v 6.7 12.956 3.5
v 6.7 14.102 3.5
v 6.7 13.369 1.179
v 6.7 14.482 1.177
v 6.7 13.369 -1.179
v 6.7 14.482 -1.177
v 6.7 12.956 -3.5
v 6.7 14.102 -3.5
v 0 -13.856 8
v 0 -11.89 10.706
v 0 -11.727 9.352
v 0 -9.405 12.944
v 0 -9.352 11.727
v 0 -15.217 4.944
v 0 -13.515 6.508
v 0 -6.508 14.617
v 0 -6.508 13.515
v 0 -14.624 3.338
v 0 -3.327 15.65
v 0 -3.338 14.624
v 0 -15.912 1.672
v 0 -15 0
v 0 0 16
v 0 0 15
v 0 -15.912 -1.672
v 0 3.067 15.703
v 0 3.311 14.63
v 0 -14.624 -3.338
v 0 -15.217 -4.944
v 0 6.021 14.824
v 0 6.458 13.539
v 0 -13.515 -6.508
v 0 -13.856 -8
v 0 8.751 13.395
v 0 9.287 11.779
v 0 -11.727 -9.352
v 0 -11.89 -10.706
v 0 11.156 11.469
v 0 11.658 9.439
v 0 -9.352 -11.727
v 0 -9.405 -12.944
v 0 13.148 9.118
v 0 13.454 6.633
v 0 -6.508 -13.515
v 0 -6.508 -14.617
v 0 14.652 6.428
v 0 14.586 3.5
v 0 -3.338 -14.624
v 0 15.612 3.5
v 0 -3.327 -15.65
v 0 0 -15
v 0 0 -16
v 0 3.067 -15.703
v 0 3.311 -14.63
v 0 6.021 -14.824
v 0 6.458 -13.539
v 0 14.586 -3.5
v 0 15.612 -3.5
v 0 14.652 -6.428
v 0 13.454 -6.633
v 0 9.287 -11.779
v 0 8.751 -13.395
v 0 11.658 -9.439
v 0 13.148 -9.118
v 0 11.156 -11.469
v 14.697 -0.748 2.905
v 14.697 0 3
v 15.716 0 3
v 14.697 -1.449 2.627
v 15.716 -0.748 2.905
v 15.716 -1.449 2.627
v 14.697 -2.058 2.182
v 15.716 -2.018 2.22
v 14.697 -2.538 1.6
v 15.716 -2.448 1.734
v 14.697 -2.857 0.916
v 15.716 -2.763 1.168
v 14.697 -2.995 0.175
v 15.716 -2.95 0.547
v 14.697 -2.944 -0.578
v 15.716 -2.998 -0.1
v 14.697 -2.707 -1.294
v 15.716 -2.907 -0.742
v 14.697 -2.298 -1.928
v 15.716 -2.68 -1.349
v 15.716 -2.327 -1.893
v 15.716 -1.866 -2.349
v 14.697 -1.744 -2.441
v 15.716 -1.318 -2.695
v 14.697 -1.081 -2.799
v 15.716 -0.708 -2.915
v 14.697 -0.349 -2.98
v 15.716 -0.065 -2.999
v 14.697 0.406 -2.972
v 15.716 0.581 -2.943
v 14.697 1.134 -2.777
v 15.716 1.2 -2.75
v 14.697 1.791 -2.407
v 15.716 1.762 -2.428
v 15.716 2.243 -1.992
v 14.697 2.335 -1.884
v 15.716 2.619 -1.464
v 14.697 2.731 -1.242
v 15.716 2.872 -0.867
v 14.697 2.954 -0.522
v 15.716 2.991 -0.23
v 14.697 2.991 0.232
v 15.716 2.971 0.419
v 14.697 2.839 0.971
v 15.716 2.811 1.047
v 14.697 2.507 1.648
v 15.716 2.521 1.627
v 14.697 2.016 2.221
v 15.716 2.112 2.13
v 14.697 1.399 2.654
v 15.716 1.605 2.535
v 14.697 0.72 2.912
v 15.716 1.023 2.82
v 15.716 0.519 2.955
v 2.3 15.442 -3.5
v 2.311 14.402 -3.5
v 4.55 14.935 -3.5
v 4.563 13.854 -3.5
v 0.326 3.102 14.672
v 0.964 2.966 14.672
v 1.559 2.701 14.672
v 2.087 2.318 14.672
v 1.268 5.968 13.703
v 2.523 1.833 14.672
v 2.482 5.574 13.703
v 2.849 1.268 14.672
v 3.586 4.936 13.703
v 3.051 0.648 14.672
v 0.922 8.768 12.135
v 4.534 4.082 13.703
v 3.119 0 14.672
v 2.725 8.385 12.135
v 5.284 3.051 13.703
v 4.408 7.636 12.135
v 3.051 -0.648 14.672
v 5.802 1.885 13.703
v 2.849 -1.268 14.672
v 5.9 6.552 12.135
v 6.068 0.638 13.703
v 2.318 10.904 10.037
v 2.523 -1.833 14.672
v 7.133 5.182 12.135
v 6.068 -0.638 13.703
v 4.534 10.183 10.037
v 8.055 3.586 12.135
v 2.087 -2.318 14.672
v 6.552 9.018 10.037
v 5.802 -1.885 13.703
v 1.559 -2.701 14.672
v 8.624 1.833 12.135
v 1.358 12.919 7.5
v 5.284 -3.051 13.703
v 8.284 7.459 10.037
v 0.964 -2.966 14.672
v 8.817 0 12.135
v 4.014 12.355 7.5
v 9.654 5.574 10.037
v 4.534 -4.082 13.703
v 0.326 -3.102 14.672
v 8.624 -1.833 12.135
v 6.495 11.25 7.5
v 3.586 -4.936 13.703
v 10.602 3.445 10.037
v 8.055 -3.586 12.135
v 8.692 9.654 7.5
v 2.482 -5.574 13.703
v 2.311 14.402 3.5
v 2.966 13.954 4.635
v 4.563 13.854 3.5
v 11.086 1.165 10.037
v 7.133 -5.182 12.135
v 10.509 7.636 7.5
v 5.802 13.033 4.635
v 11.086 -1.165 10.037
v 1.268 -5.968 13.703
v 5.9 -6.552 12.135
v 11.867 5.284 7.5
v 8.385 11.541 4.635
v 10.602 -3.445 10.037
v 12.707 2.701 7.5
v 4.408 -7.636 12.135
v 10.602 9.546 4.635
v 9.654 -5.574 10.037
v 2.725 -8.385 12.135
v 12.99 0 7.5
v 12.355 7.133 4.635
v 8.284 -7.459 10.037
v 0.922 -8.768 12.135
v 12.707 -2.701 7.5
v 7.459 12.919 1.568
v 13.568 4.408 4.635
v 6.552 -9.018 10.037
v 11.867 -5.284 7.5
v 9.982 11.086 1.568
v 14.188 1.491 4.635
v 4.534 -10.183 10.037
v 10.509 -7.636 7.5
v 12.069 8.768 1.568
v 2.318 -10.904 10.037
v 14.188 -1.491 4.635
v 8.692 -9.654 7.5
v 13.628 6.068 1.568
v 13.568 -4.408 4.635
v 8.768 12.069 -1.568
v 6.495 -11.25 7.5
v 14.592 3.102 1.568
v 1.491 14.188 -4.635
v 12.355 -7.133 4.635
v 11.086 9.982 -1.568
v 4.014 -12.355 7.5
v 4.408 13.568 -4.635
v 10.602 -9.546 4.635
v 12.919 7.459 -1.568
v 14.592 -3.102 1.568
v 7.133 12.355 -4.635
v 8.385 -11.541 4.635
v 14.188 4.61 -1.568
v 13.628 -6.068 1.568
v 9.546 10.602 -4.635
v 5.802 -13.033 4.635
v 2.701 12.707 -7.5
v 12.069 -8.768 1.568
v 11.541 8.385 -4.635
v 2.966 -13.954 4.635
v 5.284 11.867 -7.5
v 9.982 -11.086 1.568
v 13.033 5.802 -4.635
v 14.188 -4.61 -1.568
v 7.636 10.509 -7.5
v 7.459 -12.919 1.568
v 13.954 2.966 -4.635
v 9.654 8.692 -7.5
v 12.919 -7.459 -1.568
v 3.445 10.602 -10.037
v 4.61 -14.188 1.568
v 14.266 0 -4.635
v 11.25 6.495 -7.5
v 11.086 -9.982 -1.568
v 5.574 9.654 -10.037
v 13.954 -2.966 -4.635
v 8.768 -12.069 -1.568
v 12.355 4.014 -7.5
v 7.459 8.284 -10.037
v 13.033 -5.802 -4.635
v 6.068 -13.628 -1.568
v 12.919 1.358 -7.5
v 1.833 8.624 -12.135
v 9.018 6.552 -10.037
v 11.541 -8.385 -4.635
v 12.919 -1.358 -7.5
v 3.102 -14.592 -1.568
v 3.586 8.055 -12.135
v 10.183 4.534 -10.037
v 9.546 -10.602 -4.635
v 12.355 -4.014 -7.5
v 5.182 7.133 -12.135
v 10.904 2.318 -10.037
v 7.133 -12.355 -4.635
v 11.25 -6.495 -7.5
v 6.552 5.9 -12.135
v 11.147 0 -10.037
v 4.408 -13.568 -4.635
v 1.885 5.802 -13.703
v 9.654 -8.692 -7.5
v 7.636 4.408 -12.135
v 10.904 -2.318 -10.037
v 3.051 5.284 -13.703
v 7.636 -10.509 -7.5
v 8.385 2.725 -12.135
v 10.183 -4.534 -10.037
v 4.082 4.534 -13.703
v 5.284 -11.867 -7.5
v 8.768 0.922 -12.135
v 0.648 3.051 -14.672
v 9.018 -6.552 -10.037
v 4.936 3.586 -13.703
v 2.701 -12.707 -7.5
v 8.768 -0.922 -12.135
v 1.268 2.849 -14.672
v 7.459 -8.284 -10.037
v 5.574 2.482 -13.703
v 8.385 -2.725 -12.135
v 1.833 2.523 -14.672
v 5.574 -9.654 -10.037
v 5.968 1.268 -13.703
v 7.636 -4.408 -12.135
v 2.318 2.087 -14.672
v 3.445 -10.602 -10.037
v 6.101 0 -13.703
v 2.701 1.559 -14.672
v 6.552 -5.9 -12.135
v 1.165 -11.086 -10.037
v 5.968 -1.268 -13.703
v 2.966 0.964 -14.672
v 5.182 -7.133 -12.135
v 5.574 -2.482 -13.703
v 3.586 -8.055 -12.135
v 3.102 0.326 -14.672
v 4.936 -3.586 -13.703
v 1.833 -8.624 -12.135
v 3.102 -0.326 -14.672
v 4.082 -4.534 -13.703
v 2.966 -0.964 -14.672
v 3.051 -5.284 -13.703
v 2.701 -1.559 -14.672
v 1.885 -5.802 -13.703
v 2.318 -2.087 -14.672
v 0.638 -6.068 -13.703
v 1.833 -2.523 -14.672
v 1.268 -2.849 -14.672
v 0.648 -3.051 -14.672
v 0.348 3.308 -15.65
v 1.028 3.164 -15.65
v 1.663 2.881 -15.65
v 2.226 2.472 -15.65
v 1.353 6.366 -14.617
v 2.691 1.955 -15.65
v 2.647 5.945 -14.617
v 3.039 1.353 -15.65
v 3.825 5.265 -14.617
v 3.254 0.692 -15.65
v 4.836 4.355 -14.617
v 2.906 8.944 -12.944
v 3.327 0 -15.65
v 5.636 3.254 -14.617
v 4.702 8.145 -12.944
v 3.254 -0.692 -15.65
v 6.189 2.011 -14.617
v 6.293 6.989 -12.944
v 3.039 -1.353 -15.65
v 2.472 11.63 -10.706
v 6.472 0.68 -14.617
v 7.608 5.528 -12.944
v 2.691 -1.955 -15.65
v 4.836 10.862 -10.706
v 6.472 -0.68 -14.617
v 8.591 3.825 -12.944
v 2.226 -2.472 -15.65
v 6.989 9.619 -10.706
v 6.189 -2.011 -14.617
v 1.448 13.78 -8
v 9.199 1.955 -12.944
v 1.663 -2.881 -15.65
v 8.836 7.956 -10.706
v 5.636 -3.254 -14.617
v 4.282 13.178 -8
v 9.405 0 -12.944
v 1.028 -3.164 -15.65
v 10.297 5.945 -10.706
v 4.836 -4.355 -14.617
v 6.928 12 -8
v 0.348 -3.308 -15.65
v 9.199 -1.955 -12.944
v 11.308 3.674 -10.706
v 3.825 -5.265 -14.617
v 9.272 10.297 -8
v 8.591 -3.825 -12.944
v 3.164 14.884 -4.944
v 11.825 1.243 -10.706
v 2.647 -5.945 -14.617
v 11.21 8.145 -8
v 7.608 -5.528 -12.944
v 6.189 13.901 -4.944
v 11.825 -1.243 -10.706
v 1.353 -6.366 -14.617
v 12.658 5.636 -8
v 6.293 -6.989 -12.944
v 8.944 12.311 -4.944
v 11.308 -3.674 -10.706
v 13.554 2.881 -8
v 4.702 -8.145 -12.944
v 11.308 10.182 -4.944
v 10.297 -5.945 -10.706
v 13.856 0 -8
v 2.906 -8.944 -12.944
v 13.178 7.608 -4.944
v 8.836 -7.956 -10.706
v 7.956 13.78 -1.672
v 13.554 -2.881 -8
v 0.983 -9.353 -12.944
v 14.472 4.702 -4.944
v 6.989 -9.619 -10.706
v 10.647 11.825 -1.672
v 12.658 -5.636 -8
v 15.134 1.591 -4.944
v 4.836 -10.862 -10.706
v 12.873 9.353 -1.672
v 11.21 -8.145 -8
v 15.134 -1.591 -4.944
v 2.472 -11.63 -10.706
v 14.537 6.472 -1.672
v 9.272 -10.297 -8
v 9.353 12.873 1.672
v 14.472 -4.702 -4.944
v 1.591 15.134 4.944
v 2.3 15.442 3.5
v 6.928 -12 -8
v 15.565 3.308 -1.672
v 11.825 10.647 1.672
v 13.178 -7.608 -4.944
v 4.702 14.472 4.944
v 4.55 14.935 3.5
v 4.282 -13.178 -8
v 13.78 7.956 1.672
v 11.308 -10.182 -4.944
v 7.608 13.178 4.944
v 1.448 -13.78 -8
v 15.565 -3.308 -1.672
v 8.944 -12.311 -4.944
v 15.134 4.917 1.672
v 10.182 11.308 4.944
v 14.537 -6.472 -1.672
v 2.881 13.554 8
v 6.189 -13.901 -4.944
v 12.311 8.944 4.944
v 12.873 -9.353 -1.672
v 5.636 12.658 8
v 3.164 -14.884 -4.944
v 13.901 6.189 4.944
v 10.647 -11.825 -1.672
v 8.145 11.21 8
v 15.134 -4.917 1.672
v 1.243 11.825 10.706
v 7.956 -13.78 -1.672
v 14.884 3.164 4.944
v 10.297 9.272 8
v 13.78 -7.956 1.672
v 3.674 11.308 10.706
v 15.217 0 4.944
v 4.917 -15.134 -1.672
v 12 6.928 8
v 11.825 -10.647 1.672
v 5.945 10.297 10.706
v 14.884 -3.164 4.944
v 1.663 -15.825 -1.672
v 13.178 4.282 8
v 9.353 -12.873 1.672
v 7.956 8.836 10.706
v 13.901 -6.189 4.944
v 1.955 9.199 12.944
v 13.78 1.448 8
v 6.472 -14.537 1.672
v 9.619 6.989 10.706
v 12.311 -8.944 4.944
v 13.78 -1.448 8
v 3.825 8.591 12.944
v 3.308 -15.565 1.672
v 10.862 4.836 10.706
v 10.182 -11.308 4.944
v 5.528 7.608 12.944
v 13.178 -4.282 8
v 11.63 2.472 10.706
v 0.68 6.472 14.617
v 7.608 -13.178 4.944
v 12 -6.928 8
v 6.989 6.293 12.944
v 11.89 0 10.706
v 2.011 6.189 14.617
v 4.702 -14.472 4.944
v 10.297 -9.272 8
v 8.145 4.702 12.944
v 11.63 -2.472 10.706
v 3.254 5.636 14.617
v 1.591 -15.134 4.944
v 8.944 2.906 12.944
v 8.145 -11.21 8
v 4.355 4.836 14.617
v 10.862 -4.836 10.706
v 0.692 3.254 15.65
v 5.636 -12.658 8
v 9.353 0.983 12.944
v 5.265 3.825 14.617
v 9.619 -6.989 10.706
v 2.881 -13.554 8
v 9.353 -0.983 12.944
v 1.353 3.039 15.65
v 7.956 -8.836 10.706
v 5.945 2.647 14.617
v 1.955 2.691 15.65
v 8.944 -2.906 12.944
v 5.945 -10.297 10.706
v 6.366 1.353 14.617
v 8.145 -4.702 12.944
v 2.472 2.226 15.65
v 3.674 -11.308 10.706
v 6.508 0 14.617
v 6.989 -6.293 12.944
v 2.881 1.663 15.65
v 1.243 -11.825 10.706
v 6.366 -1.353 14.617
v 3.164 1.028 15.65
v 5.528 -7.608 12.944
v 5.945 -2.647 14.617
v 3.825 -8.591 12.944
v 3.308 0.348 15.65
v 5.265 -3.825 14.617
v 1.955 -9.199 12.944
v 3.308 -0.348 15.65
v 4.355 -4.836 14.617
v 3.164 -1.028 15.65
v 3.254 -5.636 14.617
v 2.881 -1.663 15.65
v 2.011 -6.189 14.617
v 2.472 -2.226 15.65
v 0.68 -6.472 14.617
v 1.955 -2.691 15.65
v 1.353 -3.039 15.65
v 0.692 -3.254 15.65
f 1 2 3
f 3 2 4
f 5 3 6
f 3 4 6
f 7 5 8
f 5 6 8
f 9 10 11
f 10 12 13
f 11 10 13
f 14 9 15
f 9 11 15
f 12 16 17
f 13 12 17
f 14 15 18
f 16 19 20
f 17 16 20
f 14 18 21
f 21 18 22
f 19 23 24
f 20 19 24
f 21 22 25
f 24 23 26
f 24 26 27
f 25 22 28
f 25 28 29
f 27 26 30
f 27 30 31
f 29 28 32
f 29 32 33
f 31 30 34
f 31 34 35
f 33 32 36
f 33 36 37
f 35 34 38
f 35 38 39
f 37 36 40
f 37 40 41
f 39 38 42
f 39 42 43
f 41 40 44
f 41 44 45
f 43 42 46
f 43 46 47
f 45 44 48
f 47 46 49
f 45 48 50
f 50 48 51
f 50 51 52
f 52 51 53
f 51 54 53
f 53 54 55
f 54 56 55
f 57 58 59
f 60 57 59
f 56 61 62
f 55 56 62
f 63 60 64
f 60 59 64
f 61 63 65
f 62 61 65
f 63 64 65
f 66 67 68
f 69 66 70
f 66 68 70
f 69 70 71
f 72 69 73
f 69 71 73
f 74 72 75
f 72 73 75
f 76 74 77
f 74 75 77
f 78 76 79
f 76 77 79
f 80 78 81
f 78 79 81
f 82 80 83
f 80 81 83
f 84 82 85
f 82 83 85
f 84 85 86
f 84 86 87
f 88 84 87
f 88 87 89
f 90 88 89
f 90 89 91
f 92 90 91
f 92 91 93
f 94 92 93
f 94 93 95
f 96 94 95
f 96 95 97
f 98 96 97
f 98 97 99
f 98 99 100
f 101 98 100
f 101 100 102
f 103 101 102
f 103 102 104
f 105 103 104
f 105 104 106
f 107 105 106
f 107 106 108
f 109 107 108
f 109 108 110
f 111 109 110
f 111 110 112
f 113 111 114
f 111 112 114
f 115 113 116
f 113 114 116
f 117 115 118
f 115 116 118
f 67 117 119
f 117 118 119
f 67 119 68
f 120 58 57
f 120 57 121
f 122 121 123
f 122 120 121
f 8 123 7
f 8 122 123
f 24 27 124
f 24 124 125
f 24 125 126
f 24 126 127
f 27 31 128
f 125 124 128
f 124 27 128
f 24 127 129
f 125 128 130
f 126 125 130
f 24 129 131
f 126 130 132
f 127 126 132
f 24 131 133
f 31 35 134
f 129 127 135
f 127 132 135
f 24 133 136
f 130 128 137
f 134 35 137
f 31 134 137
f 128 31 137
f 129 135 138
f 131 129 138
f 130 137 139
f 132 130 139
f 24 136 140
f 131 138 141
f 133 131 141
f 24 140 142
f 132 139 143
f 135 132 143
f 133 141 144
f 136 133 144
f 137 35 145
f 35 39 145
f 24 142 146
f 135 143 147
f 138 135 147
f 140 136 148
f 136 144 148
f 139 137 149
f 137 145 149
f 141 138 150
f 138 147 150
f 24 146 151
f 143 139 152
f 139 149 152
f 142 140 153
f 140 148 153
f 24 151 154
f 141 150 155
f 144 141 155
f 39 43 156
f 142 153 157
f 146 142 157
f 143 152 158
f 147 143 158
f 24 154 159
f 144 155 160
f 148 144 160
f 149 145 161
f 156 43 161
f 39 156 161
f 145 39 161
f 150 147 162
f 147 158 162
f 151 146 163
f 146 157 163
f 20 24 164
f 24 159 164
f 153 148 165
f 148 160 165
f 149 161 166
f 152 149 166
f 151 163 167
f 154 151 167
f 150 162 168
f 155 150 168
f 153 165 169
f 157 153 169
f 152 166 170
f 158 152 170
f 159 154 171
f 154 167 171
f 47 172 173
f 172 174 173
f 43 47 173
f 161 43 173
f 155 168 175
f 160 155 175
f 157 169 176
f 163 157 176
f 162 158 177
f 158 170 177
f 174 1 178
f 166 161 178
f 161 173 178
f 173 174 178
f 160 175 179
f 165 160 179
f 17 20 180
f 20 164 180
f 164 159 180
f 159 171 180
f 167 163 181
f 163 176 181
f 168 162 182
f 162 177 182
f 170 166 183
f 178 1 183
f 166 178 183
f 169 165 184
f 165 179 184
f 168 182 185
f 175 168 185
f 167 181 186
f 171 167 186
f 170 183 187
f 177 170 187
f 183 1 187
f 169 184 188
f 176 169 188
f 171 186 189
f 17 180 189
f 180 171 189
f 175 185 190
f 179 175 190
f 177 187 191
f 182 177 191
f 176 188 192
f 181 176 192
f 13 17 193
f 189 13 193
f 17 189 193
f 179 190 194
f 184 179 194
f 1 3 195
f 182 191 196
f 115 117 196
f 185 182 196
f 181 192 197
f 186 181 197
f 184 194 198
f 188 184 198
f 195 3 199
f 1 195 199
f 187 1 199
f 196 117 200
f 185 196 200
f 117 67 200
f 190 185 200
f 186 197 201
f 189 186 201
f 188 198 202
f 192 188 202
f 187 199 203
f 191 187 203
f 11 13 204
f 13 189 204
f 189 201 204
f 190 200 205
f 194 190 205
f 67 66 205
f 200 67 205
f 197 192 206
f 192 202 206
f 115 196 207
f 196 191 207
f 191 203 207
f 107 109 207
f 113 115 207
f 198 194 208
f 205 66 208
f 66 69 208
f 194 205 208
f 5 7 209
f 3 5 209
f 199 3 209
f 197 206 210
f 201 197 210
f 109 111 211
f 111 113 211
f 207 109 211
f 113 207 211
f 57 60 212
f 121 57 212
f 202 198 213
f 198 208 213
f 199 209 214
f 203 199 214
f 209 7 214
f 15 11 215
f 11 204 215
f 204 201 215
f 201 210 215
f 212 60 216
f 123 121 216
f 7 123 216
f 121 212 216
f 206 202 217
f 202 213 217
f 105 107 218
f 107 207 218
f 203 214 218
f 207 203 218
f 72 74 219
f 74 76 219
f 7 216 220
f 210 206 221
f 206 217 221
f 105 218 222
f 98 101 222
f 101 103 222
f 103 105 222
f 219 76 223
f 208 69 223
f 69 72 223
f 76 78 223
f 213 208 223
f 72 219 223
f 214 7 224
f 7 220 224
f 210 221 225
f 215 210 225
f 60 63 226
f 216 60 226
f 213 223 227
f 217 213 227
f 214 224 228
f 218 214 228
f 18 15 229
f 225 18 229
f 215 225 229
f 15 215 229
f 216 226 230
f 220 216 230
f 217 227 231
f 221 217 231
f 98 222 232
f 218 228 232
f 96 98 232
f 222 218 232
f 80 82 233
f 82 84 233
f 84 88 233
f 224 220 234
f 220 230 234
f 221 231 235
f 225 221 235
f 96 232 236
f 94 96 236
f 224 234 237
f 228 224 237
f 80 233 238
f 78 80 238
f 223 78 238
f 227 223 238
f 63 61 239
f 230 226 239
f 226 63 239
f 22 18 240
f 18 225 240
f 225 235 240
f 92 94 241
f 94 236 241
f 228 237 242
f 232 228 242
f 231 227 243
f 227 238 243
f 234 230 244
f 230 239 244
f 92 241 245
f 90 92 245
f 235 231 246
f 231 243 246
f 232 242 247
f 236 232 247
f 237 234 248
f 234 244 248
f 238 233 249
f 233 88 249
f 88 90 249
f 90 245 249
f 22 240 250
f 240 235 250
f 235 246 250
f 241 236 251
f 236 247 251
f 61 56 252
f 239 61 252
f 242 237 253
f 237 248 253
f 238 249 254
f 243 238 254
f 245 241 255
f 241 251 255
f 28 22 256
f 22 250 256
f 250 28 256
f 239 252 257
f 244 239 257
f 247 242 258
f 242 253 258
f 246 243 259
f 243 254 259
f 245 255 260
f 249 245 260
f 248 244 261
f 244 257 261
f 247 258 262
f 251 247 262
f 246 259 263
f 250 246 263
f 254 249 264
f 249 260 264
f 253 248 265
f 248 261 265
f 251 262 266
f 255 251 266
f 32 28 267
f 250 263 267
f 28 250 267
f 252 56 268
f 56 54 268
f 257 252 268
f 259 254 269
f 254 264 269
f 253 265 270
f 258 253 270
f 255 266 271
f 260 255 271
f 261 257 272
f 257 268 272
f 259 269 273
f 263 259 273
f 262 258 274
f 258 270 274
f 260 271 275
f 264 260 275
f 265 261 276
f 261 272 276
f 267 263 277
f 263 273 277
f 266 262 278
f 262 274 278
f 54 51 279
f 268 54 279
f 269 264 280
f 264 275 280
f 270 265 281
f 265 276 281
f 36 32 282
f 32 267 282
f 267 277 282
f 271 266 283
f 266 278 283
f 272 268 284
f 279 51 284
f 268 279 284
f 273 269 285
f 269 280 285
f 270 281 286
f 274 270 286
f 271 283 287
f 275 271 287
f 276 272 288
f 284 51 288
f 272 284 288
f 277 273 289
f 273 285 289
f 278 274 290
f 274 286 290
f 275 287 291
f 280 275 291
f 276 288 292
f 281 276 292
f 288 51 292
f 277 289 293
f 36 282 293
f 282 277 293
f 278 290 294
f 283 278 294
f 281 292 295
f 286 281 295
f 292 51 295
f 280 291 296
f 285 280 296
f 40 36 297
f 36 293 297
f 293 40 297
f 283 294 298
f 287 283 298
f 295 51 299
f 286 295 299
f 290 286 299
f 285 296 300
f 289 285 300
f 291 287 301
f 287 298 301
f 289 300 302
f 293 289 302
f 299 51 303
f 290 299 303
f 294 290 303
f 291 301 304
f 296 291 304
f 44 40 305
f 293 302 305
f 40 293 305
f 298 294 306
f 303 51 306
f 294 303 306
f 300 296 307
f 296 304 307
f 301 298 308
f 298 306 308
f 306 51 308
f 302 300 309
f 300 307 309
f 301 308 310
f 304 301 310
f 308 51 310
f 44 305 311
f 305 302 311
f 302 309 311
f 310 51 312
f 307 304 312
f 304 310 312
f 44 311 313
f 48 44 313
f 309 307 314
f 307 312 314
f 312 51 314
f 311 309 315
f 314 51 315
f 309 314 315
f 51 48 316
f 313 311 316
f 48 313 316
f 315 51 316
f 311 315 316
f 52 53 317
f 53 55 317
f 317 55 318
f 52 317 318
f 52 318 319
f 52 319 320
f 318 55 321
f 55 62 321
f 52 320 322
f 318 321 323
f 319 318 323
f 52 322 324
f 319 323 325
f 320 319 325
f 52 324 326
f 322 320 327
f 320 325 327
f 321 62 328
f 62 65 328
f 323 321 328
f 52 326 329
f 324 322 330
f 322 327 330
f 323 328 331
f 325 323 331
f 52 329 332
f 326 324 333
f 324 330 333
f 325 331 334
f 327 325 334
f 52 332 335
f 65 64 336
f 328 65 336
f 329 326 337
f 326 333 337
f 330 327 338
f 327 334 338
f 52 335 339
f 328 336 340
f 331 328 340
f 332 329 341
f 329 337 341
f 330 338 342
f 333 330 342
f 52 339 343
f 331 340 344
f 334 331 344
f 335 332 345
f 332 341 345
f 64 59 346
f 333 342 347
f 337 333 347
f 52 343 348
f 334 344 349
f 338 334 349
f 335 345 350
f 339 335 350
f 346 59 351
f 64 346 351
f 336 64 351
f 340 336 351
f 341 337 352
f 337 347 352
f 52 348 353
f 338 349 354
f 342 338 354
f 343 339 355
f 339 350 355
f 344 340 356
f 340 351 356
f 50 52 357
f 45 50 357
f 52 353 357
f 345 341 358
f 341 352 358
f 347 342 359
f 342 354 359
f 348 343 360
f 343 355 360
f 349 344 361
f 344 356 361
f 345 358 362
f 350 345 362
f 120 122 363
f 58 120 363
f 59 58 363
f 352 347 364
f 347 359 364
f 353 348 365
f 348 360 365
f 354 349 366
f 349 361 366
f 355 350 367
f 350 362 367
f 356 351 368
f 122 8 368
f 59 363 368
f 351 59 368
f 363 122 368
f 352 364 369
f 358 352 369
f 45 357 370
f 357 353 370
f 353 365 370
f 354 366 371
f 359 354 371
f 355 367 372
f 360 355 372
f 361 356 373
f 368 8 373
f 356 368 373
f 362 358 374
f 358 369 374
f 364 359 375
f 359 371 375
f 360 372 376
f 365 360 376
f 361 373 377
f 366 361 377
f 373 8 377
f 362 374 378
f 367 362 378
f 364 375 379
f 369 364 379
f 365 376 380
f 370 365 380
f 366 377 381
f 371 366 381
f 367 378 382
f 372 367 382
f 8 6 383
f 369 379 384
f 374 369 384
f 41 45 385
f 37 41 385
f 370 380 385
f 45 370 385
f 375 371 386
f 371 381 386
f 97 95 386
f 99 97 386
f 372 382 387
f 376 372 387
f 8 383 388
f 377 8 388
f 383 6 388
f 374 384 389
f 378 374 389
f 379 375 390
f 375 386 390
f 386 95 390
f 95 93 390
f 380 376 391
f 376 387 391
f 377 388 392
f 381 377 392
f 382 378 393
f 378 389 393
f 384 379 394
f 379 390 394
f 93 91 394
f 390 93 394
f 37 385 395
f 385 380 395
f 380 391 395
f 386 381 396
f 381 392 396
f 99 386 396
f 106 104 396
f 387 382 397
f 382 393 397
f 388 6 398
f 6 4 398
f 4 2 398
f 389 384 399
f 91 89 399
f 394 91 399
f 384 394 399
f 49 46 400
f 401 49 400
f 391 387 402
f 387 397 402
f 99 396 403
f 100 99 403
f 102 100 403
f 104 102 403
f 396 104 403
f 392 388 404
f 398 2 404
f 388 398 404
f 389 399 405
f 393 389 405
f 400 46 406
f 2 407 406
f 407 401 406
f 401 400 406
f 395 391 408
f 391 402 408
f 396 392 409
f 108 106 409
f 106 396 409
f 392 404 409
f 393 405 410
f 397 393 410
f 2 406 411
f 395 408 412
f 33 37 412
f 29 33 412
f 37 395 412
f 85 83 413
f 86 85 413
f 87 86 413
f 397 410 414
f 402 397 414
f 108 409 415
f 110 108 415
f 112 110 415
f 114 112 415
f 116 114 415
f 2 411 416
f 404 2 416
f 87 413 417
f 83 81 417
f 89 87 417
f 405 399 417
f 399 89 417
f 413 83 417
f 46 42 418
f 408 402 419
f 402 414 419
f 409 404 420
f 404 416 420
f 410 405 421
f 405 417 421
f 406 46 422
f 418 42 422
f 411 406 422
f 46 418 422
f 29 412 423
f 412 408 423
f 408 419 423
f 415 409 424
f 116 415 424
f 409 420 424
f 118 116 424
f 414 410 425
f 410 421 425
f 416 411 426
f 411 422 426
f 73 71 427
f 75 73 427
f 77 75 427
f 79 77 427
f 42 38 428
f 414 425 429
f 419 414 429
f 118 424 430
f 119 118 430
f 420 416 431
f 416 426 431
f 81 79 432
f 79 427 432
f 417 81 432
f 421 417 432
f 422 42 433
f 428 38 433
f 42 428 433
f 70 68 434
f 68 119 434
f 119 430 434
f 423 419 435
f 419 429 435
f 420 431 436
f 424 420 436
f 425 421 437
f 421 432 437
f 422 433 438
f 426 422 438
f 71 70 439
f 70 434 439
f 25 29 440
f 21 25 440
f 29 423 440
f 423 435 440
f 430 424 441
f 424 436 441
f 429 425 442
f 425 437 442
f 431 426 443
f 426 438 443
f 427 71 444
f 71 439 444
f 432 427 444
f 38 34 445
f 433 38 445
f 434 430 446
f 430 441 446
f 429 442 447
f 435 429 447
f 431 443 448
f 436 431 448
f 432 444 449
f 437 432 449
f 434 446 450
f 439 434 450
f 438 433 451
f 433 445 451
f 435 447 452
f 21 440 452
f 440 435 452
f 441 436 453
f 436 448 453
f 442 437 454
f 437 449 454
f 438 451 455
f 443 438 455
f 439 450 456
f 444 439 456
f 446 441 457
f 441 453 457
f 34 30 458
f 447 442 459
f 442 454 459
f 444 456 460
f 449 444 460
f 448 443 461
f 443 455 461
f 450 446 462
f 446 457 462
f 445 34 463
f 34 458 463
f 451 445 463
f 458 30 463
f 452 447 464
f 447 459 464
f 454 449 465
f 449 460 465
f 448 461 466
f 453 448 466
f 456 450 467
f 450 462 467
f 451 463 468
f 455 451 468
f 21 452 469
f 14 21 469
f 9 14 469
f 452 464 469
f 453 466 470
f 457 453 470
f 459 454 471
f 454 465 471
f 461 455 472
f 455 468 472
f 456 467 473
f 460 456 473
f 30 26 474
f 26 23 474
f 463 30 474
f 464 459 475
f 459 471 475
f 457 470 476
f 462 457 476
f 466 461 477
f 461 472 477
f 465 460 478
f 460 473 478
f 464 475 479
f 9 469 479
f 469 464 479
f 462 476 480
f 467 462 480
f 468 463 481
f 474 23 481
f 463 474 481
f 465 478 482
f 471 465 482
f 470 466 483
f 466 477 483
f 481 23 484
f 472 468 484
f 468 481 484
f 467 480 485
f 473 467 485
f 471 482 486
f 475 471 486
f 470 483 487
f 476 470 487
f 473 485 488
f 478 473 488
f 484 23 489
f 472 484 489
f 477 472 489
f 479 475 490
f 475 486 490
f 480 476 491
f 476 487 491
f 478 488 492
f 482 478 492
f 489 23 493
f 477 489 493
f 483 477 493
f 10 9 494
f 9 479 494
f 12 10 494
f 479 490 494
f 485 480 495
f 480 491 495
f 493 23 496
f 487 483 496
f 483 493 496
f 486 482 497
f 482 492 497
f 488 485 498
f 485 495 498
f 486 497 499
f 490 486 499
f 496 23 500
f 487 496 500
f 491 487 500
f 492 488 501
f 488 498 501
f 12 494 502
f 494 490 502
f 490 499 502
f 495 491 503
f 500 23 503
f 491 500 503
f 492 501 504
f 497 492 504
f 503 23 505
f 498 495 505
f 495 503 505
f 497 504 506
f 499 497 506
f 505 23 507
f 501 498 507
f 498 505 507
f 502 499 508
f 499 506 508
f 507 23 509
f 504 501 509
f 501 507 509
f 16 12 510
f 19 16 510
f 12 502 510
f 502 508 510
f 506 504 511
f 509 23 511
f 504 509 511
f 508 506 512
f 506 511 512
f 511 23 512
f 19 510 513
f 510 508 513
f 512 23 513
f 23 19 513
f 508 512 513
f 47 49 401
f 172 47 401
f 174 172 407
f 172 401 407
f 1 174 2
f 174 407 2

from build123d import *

# Parameters (mm, degrees)
REVOLVE_2_ANGLE     = 180
SKETCH_3_R          = 3
CUT_EXTRUDE_1_DEPTH = 10
SKETCH_4_W          = 6.7
SKETCH_4_H          = 7
CUT_EXTRUDE_2_DEPTH = 20


with BuildPart() as part:
    # 草图1 → 旋转2 (revolve)
    with BuildSketch(Plane(origin=(0, 0, 0), x_dir=(0, 0, -1), z_dir=(1, 0, 0))):
        with BuildLine():
            Line((-16, 0), (-15, 0))
            ThreePointArc((-15, 0), (0, 15), (15, 0))
            Line((15, 0), (16, 0))
            ThreePointArc((16, 0), (0, 16), (-16, 0))
        make_face()
    revolve(axis=Axis((0, 0, -15), (0, 0, -1)), revolution_arc=REVOLVE_2_ANGLE)

    # 草图3 → 切除-拉伸1 (cut)
    with BuildSketch(Plane(origin=(20.295894922, 0, 0), x_dir=(0, 0, -1), z_dir=(1, 0, 0))):
        with Locations(Location((0, 0, 0), (0, 0, 180))):
            Circle(SKETCH_3_R)
    extrude(amount=-CUT_EXTRUDE_1_DEPTH, mode=Mode.SUBTRACT)

    # 草图4 → 切除-拉伸2 (cut)
    with BuildSketch(Plane(origin=(0, 27.814479009, 0), x_dir=(1, 0, 0), z_dir=(0, 1, 0))):
        with Locations((3.35, 0)):
            Rectangle(SKETCH_4_W, SKETCH_4_H)
    extrude(amount=-CUT_EXTRUDE_2_DEPTH, mode=Mode.SUBTRACT)


solid = part.part
